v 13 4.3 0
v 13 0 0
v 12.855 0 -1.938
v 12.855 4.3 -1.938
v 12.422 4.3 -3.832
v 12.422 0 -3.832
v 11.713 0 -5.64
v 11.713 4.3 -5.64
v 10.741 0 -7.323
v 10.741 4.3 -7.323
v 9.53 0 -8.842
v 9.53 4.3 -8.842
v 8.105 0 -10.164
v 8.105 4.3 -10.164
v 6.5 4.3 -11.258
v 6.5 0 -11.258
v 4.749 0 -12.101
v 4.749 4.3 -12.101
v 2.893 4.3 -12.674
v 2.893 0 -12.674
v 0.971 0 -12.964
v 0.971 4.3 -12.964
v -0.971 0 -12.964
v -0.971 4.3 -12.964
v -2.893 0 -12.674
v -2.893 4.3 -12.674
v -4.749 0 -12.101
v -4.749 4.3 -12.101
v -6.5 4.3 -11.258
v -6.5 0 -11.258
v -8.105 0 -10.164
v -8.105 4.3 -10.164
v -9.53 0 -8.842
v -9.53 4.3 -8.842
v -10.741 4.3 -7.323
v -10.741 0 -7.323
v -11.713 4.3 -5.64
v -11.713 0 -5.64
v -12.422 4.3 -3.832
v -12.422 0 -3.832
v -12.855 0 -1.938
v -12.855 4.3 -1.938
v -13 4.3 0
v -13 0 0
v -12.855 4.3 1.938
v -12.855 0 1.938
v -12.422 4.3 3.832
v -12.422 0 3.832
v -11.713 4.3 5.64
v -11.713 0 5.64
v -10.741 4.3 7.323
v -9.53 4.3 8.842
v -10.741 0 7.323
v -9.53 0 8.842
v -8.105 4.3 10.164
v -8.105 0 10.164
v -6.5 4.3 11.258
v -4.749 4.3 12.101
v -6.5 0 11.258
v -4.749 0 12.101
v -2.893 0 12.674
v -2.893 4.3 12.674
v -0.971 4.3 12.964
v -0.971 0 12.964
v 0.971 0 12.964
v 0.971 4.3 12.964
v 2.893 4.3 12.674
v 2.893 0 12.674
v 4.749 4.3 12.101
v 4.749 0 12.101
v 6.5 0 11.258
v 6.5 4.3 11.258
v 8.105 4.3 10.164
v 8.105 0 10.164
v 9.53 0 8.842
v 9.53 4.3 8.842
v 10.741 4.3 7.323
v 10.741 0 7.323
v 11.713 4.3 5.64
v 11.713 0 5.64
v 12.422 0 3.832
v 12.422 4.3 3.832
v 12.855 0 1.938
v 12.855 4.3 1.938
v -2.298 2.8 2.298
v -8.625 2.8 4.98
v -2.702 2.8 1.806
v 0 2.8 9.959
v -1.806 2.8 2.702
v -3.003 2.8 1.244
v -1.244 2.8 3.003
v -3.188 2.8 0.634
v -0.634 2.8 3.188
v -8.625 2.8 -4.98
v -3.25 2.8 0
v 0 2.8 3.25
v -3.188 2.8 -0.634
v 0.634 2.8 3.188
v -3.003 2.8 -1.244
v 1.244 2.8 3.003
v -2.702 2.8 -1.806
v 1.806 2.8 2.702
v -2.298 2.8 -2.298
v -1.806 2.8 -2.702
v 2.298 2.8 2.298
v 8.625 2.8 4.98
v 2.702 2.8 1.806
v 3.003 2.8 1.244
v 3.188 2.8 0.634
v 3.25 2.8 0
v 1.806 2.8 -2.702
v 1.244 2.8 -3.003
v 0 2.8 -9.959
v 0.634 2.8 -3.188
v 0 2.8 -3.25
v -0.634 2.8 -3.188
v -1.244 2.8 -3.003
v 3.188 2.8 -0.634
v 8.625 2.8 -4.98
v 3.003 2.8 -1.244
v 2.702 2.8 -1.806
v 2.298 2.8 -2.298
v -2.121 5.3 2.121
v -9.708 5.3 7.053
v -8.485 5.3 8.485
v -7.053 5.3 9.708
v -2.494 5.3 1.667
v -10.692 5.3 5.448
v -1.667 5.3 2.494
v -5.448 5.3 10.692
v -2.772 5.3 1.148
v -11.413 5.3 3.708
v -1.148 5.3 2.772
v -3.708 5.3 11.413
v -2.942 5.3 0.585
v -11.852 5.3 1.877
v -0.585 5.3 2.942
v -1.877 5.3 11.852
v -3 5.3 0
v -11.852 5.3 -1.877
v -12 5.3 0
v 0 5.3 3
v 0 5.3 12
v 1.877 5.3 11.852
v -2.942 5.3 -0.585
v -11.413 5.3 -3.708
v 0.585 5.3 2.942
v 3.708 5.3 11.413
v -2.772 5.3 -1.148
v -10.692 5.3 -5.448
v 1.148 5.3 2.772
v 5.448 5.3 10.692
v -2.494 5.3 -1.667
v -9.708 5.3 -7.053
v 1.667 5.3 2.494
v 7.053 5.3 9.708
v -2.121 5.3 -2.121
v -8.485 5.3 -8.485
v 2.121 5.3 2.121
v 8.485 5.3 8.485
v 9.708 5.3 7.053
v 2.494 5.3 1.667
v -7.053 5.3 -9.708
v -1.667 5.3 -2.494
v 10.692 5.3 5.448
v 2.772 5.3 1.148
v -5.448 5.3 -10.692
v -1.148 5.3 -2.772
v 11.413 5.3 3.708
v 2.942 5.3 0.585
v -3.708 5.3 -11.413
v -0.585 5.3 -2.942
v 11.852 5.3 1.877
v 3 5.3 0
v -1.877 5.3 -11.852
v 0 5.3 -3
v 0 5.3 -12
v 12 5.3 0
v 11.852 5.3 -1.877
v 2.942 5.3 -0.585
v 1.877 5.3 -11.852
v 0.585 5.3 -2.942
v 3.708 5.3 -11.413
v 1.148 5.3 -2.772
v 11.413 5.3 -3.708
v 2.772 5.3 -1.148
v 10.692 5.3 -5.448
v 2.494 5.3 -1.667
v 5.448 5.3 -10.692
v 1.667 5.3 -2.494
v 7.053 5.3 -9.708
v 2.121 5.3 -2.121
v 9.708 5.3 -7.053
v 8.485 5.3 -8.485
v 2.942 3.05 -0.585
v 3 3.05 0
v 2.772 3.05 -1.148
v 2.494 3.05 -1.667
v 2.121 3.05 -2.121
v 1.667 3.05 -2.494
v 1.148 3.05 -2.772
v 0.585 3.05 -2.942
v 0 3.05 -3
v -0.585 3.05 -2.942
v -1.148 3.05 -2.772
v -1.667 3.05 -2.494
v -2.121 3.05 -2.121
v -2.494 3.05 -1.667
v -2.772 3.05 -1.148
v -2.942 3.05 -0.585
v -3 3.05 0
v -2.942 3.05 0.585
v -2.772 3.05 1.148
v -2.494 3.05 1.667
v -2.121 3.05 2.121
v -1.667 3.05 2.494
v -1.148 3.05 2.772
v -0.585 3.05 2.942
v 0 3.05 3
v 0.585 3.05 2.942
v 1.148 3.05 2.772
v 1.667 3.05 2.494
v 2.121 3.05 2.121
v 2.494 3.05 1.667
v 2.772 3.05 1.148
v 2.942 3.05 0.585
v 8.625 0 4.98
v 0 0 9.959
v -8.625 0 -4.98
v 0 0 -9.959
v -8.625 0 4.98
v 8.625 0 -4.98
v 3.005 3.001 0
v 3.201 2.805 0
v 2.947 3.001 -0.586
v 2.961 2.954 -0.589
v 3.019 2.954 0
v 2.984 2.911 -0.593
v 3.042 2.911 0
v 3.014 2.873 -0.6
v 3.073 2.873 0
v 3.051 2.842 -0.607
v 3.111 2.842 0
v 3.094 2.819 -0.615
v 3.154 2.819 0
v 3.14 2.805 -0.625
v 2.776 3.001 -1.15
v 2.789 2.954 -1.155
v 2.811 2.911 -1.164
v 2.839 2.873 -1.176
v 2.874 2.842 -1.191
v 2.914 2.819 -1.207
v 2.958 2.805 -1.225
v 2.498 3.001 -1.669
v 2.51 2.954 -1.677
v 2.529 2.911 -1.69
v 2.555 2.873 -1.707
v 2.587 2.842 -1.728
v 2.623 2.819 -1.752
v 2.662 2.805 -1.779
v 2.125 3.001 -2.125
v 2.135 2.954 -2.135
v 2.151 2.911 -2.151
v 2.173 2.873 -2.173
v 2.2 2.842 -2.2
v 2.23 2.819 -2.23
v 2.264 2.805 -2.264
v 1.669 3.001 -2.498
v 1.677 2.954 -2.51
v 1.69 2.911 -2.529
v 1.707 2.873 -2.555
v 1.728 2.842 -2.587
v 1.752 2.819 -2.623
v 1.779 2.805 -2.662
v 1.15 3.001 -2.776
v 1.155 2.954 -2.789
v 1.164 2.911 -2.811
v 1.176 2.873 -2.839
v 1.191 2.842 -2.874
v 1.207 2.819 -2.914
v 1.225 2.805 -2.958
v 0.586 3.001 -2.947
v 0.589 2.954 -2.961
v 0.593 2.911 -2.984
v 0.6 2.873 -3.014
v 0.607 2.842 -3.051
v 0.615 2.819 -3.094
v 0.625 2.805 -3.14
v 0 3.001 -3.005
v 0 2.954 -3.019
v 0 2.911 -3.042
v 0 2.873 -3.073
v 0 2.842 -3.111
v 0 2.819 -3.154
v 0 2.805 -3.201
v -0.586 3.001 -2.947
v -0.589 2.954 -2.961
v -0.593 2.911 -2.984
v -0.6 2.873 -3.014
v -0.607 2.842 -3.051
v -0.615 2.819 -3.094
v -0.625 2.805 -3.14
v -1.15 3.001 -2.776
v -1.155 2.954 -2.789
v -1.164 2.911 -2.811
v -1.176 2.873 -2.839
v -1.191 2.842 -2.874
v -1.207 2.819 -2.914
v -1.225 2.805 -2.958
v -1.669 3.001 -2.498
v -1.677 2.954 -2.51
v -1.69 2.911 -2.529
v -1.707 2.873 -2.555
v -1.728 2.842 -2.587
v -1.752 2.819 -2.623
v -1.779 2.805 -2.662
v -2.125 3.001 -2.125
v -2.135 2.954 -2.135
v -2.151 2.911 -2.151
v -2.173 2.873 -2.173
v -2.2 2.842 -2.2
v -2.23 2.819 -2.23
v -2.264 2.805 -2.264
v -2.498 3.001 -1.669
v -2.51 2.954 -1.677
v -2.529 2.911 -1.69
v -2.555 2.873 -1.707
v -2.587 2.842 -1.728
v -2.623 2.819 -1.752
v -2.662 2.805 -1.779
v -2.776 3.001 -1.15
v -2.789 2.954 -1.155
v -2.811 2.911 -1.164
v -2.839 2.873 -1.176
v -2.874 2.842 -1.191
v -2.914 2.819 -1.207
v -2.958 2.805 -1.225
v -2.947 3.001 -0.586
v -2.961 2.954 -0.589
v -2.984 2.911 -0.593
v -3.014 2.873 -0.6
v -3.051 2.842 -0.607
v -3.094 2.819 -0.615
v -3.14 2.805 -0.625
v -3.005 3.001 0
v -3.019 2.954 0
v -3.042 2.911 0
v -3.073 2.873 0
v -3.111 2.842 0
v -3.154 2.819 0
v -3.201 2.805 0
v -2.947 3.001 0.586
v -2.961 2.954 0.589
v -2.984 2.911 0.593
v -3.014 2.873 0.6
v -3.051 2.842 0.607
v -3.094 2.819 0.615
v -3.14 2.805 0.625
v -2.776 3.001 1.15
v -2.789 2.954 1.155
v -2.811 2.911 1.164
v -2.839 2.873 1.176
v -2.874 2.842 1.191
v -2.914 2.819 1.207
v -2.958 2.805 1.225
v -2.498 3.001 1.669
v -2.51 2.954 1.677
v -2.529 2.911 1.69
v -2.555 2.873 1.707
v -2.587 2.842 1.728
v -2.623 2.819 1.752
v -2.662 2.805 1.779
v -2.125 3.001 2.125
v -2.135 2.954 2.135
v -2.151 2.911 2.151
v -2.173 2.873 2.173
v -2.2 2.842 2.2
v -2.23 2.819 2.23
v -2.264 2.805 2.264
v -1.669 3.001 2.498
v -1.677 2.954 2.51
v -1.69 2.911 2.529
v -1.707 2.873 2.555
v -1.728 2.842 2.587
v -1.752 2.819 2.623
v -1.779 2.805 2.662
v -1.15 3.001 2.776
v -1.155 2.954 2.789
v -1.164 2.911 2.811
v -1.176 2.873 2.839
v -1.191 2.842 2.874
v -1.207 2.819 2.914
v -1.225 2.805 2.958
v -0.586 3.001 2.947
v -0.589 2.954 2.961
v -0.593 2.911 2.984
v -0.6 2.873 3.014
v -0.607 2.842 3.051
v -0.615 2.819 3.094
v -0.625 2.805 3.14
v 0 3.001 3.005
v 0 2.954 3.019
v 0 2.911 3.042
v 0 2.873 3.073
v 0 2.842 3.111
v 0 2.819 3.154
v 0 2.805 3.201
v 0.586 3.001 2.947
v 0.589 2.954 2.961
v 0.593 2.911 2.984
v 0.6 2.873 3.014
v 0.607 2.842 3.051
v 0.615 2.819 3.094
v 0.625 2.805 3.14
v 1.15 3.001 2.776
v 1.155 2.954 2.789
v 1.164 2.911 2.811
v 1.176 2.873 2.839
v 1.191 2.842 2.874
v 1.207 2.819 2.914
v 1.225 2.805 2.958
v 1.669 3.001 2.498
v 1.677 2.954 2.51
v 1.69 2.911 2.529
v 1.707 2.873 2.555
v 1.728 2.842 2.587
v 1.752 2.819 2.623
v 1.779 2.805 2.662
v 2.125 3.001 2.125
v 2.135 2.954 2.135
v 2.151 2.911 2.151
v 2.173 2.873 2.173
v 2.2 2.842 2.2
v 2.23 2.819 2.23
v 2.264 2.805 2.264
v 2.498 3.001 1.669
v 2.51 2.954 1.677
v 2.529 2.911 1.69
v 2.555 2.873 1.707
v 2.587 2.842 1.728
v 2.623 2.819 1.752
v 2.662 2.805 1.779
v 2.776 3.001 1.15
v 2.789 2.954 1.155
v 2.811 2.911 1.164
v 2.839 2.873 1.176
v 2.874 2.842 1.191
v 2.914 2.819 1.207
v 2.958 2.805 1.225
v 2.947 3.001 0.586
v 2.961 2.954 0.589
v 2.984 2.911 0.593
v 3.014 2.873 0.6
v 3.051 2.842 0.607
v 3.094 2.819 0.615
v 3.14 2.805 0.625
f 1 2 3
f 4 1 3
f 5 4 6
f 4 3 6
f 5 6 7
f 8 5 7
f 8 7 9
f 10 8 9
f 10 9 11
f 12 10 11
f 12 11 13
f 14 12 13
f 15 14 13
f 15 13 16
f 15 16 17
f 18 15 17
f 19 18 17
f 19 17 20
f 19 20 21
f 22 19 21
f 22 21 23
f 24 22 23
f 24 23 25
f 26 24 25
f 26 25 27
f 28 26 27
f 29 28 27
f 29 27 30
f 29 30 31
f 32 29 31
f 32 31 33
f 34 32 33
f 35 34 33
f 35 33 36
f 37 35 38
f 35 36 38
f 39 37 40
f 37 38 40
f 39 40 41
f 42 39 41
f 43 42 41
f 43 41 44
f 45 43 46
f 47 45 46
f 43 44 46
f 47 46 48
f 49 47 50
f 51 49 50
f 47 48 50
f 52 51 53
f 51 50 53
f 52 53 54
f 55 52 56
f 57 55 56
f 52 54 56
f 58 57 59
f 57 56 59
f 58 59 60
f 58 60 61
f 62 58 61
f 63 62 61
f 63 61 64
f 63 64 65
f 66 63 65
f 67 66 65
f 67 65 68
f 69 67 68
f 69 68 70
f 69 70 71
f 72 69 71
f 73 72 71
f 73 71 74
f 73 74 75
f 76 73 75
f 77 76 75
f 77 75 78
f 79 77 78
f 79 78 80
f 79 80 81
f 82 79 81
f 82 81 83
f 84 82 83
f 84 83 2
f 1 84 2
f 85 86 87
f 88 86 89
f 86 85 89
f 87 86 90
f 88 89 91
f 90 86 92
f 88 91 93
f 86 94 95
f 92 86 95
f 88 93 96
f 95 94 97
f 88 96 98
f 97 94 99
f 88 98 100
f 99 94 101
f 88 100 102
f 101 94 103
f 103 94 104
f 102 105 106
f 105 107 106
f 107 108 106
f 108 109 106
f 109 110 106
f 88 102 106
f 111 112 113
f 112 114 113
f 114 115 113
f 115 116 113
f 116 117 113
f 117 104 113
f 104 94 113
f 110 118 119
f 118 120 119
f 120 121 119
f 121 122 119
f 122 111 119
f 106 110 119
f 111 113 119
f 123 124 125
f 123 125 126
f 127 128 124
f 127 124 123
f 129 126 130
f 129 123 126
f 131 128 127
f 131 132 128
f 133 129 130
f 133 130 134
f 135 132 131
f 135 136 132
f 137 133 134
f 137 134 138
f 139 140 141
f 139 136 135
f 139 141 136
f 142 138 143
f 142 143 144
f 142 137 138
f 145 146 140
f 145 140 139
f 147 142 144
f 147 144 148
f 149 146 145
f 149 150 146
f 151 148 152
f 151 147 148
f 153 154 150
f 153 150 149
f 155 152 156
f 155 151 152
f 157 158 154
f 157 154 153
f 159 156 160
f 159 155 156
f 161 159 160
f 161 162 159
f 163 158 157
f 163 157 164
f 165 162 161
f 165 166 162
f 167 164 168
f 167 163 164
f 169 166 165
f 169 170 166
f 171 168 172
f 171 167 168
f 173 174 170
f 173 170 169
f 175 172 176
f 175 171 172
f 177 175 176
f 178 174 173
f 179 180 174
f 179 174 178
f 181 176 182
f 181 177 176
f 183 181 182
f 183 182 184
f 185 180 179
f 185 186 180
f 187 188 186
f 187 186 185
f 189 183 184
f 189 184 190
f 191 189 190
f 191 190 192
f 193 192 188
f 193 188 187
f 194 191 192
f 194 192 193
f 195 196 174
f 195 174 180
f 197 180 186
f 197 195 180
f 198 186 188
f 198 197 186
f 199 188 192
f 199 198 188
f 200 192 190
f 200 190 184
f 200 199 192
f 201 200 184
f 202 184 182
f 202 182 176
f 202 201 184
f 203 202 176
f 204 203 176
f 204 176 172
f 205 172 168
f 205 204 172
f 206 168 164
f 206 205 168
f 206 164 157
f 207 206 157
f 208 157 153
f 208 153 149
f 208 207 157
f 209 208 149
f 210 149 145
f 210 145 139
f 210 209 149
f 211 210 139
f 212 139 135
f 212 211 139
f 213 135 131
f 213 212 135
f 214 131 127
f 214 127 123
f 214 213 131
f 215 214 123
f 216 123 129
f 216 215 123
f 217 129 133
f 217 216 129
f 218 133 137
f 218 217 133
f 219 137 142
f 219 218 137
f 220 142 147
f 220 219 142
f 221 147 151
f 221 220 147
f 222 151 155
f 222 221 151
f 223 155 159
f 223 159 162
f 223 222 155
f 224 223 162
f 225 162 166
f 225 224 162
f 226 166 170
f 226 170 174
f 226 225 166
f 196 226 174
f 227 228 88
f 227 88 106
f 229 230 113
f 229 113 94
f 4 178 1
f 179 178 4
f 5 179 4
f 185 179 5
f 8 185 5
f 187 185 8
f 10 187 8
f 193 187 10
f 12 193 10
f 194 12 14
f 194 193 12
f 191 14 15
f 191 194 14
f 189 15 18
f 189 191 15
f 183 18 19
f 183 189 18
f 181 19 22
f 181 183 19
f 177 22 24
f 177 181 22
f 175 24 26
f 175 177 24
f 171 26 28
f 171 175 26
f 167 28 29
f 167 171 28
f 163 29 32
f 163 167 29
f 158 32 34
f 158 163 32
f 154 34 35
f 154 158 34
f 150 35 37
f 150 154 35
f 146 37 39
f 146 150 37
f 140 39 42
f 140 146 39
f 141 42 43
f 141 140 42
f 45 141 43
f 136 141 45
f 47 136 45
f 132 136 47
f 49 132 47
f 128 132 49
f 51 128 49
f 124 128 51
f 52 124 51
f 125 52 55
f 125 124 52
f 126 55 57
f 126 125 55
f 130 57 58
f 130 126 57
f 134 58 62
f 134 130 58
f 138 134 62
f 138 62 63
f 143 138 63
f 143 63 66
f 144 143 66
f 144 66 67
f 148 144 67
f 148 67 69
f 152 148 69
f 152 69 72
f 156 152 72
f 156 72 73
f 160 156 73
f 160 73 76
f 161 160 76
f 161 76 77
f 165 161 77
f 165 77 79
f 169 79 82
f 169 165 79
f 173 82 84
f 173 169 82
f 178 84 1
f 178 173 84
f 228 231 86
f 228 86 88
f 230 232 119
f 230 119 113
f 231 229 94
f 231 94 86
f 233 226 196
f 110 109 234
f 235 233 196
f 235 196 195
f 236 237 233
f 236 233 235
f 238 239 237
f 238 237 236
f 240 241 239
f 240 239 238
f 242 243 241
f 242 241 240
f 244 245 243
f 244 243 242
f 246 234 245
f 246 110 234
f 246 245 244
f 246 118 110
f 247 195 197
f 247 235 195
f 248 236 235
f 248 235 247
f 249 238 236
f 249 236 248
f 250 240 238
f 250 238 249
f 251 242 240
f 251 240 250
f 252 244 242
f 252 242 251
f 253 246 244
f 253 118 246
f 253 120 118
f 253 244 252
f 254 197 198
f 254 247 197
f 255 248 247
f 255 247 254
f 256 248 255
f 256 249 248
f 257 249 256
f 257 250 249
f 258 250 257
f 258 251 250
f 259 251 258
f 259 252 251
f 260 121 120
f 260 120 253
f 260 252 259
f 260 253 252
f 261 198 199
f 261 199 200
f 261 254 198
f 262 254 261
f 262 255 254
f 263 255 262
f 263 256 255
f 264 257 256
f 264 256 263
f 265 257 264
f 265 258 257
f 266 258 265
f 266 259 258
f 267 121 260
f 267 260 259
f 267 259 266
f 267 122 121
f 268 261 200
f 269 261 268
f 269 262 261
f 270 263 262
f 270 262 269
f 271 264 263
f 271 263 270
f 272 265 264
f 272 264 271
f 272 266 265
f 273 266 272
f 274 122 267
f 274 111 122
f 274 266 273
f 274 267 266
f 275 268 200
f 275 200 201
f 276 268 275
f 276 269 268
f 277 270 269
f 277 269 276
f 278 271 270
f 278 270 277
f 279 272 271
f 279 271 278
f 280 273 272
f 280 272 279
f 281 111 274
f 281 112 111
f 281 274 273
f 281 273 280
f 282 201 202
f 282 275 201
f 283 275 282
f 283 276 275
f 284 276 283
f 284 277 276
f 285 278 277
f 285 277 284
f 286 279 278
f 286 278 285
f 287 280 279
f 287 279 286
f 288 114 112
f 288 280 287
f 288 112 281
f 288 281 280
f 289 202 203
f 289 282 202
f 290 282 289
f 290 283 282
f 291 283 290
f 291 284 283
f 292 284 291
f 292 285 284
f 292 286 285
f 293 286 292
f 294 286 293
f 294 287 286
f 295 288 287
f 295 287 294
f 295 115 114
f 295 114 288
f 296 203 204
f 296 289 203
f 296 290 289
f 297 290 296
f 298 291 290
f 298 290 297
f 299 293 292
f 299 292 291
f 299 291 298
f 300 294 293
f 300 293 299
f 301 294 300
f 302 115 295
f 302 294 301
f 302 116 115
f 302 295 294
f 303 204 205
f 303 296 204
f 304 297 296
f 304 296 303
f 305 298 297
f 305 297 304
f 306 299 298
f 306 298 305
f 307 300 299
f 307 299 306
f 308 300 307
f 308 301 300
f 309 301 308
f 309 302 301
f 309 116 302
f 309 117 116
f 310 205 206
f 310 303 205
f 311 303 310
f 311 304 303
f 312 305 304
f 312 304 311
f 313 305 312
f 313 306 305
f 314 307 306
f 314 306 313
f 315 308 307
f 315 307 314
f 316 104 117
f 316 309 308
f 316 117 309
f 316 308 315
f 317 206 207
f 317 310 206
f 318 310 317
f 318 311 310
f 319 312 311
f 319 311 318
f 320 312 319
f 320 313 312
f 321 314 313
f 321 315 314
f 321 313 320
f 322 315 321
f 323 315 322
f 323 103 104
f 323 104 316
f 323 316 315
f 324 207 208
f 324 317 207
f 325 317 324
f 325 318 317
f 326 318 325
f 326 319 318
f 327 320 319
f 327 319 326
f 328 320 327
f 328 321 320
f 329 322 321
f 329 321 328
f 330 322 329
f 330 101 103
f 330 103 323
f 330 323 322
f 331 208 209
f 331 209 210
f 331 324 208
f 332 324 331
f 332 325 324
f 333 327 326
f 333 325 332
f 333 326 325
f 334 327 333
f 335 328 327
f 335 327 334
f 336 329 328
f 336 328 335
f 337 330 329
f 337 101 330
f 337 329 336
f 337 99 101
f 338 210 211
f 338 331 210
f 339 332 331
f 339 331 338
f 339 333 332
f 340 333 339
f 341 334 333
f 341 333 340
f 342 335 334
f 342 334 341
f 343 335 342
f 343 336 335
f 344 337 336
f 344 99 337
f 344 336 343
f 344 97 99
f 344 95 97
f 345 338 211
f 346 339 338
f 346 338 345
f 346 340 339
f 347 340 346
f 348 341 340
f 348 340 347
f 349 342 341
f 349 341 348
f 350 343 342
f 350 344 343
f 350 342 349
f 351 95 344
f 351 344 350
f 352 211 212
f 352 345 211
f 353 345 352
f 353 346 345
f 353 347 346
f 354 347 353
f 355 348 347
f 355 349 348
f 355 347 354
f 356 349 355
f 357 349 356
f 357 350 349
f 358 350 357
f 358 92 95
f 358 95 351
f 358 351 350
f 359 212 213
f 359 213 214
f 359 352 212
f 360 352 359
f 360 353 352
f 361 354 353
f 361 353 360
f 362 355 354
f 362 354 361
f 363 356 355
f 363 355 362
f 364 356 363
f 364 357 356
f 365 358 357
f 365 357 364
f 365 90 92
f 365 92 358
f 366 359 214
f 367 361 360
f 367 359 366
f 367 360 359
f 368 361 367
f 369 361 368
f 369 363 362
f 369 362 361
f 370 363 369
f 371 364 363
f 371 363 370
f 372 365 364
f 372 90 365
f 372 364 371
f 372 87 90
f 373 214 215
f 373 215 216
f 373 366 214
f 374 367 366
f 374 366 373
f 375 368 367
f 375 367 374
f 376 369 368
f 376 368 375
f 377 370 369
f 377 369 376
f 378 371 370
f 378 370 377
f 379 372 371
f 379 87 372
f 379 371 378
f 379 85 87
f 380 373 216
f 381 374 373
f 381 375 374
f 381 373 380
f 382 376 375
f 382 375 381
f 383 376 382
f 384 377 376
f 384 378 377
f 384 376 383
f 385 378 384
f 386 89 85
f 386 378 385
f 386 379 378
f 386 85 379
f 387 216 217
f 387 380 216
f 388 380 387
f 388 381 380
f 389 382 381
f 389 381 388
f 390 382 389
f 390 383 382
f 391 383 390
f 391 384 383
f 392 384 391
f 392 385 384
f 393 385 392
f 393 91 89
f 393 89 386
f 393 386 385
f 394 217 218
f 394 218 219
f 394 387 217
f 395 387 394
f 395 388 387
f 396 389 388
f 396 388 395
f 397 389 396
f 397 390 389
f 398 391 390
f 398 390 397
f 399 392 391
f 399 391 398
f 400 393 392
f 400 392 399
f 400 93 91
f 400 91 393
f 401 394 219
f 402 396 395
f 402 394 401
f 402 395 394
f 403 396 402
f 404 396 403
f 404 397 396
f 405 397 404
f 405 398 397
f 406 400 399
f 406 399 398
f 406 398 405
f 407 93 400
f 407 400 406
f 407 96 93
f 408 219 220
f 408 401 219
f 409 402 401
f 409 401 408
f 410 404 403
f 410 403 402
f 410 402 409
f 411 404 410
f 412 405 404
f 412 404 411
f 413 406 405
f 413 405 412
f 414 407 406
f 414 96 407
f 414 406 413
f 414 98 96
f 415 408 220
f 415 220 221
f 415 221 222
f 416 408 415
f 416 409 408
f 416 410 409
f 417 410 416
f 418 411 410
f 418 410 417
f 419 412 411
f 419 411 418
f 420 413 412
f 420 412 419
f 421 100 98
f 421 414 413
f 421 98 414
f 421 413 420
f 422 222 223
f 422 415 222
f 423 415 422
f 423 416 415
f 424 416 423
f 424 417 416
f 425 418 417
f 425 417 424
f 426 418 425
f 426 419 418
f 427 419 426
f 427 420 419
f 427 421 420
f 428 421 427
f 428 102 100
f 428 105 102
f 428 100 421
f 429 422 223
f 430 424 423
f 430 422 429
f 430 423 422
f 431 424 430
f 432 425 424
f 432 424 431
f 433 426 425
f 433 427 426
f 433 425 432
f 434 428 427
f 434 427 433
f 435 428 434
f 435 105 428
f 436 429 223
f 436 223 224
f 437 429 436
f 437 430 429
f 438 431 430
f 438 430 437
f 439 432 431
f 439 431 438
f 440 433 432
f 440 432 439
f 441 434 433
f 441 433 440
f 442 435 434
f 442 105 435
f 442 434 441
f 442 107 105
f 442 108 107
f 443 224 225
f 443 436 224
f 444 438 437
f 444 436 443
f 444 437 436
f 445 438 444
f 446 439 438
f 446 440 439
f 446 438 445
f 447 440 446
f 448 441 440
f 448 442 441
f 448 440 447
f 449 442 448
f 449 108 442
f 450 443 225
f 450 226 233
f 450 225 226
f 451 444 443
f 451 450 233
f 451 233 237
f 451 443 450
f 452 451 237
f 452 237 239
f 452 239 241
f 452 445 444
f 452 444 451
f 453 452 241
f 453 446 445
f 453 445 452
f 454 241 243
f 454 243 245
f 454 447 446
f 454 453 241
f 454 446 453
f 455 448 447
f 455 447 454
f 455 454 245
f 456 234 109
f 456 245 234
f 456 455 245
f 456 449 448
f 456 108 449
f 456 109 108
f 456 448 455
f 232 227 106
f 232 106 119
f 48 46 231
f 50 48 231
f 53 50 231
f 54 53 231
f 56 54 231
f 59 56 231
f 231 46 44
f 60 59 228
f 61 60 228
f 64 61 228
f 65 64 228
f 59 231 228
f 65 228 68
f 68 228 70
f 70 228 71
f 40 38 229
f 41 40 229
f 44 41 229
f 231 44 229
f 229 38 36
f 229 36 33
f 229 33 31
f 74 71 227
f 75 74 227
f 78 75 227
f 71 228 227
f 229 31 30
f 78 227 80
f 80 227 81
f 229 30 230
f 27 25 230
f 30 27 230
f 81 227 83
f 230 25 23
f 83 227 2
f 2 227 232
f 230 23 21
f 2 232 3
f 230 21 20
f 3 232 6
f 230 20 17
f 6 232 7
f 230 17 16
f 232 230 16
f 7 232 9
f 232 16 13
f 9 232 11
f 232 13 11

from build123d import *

# Parameters (mm, degrees)
SKETCH1_R           = 13
BOSS_EXTRUDE1_DEPTH = 2.8
SKETCH2_R           = 13
SKETCH2_R_2         = 3
BOSS_EXTRUDE2_DEPTH = 2.5
CHAMFER1_SIZE       = 1
FILLET1_R           = 0.25


with BuildPart() as part:
    # Sketch1 → Boss-Extrude1 (new body)
    with BuildSketch(Plane(origin=(0, 0, 0), x_dir=(1, 0, 0), z_dir=(0, 1, 0))):
        Circle(SKETCH1_R)
        Polygon((0, -9.959292144), (8.625, -4.979646072), (8.625, 4.979646072), (0, 9.959292144), (-8.625, 4.979646072), (-8.625, -4.979646072), align=None, mode=Mode.SUBTRACT)
    extrude(amount=BOSS_EXTRUDE1_DEPTH)

    # Sketch2 → Boss-Extrude2 (add)
    with BuildSketch(Plane(origin=(0, 2.8, 0), x_dir=(1, 0, 0), z_dir=(0, 1, 0))):
        Circle(SKETCH2_R)
        Circle(SKETCH2_R_2, mode=Mode.SUBTRACT)
    extrude(amount=BOSS_EXTRUDE2_DEPTH)

    # Chamfer1
    chamfer1_edges = [part.edges().sort_by_distance(p)[0] for p in [
        (-13, 5.3, 0),
    ]]
    chamfer(chamfer1_edges, length=CHAMFER1_SIZE)

    # Fillet1
    fillet1_edges = [part.edges().sort_by_distance(p)[0] for p in [
        (-3, 2.8, 0),
    ]]
    fillet(fillet1_edges, radius=FILLET1_R)


solid = part.part
